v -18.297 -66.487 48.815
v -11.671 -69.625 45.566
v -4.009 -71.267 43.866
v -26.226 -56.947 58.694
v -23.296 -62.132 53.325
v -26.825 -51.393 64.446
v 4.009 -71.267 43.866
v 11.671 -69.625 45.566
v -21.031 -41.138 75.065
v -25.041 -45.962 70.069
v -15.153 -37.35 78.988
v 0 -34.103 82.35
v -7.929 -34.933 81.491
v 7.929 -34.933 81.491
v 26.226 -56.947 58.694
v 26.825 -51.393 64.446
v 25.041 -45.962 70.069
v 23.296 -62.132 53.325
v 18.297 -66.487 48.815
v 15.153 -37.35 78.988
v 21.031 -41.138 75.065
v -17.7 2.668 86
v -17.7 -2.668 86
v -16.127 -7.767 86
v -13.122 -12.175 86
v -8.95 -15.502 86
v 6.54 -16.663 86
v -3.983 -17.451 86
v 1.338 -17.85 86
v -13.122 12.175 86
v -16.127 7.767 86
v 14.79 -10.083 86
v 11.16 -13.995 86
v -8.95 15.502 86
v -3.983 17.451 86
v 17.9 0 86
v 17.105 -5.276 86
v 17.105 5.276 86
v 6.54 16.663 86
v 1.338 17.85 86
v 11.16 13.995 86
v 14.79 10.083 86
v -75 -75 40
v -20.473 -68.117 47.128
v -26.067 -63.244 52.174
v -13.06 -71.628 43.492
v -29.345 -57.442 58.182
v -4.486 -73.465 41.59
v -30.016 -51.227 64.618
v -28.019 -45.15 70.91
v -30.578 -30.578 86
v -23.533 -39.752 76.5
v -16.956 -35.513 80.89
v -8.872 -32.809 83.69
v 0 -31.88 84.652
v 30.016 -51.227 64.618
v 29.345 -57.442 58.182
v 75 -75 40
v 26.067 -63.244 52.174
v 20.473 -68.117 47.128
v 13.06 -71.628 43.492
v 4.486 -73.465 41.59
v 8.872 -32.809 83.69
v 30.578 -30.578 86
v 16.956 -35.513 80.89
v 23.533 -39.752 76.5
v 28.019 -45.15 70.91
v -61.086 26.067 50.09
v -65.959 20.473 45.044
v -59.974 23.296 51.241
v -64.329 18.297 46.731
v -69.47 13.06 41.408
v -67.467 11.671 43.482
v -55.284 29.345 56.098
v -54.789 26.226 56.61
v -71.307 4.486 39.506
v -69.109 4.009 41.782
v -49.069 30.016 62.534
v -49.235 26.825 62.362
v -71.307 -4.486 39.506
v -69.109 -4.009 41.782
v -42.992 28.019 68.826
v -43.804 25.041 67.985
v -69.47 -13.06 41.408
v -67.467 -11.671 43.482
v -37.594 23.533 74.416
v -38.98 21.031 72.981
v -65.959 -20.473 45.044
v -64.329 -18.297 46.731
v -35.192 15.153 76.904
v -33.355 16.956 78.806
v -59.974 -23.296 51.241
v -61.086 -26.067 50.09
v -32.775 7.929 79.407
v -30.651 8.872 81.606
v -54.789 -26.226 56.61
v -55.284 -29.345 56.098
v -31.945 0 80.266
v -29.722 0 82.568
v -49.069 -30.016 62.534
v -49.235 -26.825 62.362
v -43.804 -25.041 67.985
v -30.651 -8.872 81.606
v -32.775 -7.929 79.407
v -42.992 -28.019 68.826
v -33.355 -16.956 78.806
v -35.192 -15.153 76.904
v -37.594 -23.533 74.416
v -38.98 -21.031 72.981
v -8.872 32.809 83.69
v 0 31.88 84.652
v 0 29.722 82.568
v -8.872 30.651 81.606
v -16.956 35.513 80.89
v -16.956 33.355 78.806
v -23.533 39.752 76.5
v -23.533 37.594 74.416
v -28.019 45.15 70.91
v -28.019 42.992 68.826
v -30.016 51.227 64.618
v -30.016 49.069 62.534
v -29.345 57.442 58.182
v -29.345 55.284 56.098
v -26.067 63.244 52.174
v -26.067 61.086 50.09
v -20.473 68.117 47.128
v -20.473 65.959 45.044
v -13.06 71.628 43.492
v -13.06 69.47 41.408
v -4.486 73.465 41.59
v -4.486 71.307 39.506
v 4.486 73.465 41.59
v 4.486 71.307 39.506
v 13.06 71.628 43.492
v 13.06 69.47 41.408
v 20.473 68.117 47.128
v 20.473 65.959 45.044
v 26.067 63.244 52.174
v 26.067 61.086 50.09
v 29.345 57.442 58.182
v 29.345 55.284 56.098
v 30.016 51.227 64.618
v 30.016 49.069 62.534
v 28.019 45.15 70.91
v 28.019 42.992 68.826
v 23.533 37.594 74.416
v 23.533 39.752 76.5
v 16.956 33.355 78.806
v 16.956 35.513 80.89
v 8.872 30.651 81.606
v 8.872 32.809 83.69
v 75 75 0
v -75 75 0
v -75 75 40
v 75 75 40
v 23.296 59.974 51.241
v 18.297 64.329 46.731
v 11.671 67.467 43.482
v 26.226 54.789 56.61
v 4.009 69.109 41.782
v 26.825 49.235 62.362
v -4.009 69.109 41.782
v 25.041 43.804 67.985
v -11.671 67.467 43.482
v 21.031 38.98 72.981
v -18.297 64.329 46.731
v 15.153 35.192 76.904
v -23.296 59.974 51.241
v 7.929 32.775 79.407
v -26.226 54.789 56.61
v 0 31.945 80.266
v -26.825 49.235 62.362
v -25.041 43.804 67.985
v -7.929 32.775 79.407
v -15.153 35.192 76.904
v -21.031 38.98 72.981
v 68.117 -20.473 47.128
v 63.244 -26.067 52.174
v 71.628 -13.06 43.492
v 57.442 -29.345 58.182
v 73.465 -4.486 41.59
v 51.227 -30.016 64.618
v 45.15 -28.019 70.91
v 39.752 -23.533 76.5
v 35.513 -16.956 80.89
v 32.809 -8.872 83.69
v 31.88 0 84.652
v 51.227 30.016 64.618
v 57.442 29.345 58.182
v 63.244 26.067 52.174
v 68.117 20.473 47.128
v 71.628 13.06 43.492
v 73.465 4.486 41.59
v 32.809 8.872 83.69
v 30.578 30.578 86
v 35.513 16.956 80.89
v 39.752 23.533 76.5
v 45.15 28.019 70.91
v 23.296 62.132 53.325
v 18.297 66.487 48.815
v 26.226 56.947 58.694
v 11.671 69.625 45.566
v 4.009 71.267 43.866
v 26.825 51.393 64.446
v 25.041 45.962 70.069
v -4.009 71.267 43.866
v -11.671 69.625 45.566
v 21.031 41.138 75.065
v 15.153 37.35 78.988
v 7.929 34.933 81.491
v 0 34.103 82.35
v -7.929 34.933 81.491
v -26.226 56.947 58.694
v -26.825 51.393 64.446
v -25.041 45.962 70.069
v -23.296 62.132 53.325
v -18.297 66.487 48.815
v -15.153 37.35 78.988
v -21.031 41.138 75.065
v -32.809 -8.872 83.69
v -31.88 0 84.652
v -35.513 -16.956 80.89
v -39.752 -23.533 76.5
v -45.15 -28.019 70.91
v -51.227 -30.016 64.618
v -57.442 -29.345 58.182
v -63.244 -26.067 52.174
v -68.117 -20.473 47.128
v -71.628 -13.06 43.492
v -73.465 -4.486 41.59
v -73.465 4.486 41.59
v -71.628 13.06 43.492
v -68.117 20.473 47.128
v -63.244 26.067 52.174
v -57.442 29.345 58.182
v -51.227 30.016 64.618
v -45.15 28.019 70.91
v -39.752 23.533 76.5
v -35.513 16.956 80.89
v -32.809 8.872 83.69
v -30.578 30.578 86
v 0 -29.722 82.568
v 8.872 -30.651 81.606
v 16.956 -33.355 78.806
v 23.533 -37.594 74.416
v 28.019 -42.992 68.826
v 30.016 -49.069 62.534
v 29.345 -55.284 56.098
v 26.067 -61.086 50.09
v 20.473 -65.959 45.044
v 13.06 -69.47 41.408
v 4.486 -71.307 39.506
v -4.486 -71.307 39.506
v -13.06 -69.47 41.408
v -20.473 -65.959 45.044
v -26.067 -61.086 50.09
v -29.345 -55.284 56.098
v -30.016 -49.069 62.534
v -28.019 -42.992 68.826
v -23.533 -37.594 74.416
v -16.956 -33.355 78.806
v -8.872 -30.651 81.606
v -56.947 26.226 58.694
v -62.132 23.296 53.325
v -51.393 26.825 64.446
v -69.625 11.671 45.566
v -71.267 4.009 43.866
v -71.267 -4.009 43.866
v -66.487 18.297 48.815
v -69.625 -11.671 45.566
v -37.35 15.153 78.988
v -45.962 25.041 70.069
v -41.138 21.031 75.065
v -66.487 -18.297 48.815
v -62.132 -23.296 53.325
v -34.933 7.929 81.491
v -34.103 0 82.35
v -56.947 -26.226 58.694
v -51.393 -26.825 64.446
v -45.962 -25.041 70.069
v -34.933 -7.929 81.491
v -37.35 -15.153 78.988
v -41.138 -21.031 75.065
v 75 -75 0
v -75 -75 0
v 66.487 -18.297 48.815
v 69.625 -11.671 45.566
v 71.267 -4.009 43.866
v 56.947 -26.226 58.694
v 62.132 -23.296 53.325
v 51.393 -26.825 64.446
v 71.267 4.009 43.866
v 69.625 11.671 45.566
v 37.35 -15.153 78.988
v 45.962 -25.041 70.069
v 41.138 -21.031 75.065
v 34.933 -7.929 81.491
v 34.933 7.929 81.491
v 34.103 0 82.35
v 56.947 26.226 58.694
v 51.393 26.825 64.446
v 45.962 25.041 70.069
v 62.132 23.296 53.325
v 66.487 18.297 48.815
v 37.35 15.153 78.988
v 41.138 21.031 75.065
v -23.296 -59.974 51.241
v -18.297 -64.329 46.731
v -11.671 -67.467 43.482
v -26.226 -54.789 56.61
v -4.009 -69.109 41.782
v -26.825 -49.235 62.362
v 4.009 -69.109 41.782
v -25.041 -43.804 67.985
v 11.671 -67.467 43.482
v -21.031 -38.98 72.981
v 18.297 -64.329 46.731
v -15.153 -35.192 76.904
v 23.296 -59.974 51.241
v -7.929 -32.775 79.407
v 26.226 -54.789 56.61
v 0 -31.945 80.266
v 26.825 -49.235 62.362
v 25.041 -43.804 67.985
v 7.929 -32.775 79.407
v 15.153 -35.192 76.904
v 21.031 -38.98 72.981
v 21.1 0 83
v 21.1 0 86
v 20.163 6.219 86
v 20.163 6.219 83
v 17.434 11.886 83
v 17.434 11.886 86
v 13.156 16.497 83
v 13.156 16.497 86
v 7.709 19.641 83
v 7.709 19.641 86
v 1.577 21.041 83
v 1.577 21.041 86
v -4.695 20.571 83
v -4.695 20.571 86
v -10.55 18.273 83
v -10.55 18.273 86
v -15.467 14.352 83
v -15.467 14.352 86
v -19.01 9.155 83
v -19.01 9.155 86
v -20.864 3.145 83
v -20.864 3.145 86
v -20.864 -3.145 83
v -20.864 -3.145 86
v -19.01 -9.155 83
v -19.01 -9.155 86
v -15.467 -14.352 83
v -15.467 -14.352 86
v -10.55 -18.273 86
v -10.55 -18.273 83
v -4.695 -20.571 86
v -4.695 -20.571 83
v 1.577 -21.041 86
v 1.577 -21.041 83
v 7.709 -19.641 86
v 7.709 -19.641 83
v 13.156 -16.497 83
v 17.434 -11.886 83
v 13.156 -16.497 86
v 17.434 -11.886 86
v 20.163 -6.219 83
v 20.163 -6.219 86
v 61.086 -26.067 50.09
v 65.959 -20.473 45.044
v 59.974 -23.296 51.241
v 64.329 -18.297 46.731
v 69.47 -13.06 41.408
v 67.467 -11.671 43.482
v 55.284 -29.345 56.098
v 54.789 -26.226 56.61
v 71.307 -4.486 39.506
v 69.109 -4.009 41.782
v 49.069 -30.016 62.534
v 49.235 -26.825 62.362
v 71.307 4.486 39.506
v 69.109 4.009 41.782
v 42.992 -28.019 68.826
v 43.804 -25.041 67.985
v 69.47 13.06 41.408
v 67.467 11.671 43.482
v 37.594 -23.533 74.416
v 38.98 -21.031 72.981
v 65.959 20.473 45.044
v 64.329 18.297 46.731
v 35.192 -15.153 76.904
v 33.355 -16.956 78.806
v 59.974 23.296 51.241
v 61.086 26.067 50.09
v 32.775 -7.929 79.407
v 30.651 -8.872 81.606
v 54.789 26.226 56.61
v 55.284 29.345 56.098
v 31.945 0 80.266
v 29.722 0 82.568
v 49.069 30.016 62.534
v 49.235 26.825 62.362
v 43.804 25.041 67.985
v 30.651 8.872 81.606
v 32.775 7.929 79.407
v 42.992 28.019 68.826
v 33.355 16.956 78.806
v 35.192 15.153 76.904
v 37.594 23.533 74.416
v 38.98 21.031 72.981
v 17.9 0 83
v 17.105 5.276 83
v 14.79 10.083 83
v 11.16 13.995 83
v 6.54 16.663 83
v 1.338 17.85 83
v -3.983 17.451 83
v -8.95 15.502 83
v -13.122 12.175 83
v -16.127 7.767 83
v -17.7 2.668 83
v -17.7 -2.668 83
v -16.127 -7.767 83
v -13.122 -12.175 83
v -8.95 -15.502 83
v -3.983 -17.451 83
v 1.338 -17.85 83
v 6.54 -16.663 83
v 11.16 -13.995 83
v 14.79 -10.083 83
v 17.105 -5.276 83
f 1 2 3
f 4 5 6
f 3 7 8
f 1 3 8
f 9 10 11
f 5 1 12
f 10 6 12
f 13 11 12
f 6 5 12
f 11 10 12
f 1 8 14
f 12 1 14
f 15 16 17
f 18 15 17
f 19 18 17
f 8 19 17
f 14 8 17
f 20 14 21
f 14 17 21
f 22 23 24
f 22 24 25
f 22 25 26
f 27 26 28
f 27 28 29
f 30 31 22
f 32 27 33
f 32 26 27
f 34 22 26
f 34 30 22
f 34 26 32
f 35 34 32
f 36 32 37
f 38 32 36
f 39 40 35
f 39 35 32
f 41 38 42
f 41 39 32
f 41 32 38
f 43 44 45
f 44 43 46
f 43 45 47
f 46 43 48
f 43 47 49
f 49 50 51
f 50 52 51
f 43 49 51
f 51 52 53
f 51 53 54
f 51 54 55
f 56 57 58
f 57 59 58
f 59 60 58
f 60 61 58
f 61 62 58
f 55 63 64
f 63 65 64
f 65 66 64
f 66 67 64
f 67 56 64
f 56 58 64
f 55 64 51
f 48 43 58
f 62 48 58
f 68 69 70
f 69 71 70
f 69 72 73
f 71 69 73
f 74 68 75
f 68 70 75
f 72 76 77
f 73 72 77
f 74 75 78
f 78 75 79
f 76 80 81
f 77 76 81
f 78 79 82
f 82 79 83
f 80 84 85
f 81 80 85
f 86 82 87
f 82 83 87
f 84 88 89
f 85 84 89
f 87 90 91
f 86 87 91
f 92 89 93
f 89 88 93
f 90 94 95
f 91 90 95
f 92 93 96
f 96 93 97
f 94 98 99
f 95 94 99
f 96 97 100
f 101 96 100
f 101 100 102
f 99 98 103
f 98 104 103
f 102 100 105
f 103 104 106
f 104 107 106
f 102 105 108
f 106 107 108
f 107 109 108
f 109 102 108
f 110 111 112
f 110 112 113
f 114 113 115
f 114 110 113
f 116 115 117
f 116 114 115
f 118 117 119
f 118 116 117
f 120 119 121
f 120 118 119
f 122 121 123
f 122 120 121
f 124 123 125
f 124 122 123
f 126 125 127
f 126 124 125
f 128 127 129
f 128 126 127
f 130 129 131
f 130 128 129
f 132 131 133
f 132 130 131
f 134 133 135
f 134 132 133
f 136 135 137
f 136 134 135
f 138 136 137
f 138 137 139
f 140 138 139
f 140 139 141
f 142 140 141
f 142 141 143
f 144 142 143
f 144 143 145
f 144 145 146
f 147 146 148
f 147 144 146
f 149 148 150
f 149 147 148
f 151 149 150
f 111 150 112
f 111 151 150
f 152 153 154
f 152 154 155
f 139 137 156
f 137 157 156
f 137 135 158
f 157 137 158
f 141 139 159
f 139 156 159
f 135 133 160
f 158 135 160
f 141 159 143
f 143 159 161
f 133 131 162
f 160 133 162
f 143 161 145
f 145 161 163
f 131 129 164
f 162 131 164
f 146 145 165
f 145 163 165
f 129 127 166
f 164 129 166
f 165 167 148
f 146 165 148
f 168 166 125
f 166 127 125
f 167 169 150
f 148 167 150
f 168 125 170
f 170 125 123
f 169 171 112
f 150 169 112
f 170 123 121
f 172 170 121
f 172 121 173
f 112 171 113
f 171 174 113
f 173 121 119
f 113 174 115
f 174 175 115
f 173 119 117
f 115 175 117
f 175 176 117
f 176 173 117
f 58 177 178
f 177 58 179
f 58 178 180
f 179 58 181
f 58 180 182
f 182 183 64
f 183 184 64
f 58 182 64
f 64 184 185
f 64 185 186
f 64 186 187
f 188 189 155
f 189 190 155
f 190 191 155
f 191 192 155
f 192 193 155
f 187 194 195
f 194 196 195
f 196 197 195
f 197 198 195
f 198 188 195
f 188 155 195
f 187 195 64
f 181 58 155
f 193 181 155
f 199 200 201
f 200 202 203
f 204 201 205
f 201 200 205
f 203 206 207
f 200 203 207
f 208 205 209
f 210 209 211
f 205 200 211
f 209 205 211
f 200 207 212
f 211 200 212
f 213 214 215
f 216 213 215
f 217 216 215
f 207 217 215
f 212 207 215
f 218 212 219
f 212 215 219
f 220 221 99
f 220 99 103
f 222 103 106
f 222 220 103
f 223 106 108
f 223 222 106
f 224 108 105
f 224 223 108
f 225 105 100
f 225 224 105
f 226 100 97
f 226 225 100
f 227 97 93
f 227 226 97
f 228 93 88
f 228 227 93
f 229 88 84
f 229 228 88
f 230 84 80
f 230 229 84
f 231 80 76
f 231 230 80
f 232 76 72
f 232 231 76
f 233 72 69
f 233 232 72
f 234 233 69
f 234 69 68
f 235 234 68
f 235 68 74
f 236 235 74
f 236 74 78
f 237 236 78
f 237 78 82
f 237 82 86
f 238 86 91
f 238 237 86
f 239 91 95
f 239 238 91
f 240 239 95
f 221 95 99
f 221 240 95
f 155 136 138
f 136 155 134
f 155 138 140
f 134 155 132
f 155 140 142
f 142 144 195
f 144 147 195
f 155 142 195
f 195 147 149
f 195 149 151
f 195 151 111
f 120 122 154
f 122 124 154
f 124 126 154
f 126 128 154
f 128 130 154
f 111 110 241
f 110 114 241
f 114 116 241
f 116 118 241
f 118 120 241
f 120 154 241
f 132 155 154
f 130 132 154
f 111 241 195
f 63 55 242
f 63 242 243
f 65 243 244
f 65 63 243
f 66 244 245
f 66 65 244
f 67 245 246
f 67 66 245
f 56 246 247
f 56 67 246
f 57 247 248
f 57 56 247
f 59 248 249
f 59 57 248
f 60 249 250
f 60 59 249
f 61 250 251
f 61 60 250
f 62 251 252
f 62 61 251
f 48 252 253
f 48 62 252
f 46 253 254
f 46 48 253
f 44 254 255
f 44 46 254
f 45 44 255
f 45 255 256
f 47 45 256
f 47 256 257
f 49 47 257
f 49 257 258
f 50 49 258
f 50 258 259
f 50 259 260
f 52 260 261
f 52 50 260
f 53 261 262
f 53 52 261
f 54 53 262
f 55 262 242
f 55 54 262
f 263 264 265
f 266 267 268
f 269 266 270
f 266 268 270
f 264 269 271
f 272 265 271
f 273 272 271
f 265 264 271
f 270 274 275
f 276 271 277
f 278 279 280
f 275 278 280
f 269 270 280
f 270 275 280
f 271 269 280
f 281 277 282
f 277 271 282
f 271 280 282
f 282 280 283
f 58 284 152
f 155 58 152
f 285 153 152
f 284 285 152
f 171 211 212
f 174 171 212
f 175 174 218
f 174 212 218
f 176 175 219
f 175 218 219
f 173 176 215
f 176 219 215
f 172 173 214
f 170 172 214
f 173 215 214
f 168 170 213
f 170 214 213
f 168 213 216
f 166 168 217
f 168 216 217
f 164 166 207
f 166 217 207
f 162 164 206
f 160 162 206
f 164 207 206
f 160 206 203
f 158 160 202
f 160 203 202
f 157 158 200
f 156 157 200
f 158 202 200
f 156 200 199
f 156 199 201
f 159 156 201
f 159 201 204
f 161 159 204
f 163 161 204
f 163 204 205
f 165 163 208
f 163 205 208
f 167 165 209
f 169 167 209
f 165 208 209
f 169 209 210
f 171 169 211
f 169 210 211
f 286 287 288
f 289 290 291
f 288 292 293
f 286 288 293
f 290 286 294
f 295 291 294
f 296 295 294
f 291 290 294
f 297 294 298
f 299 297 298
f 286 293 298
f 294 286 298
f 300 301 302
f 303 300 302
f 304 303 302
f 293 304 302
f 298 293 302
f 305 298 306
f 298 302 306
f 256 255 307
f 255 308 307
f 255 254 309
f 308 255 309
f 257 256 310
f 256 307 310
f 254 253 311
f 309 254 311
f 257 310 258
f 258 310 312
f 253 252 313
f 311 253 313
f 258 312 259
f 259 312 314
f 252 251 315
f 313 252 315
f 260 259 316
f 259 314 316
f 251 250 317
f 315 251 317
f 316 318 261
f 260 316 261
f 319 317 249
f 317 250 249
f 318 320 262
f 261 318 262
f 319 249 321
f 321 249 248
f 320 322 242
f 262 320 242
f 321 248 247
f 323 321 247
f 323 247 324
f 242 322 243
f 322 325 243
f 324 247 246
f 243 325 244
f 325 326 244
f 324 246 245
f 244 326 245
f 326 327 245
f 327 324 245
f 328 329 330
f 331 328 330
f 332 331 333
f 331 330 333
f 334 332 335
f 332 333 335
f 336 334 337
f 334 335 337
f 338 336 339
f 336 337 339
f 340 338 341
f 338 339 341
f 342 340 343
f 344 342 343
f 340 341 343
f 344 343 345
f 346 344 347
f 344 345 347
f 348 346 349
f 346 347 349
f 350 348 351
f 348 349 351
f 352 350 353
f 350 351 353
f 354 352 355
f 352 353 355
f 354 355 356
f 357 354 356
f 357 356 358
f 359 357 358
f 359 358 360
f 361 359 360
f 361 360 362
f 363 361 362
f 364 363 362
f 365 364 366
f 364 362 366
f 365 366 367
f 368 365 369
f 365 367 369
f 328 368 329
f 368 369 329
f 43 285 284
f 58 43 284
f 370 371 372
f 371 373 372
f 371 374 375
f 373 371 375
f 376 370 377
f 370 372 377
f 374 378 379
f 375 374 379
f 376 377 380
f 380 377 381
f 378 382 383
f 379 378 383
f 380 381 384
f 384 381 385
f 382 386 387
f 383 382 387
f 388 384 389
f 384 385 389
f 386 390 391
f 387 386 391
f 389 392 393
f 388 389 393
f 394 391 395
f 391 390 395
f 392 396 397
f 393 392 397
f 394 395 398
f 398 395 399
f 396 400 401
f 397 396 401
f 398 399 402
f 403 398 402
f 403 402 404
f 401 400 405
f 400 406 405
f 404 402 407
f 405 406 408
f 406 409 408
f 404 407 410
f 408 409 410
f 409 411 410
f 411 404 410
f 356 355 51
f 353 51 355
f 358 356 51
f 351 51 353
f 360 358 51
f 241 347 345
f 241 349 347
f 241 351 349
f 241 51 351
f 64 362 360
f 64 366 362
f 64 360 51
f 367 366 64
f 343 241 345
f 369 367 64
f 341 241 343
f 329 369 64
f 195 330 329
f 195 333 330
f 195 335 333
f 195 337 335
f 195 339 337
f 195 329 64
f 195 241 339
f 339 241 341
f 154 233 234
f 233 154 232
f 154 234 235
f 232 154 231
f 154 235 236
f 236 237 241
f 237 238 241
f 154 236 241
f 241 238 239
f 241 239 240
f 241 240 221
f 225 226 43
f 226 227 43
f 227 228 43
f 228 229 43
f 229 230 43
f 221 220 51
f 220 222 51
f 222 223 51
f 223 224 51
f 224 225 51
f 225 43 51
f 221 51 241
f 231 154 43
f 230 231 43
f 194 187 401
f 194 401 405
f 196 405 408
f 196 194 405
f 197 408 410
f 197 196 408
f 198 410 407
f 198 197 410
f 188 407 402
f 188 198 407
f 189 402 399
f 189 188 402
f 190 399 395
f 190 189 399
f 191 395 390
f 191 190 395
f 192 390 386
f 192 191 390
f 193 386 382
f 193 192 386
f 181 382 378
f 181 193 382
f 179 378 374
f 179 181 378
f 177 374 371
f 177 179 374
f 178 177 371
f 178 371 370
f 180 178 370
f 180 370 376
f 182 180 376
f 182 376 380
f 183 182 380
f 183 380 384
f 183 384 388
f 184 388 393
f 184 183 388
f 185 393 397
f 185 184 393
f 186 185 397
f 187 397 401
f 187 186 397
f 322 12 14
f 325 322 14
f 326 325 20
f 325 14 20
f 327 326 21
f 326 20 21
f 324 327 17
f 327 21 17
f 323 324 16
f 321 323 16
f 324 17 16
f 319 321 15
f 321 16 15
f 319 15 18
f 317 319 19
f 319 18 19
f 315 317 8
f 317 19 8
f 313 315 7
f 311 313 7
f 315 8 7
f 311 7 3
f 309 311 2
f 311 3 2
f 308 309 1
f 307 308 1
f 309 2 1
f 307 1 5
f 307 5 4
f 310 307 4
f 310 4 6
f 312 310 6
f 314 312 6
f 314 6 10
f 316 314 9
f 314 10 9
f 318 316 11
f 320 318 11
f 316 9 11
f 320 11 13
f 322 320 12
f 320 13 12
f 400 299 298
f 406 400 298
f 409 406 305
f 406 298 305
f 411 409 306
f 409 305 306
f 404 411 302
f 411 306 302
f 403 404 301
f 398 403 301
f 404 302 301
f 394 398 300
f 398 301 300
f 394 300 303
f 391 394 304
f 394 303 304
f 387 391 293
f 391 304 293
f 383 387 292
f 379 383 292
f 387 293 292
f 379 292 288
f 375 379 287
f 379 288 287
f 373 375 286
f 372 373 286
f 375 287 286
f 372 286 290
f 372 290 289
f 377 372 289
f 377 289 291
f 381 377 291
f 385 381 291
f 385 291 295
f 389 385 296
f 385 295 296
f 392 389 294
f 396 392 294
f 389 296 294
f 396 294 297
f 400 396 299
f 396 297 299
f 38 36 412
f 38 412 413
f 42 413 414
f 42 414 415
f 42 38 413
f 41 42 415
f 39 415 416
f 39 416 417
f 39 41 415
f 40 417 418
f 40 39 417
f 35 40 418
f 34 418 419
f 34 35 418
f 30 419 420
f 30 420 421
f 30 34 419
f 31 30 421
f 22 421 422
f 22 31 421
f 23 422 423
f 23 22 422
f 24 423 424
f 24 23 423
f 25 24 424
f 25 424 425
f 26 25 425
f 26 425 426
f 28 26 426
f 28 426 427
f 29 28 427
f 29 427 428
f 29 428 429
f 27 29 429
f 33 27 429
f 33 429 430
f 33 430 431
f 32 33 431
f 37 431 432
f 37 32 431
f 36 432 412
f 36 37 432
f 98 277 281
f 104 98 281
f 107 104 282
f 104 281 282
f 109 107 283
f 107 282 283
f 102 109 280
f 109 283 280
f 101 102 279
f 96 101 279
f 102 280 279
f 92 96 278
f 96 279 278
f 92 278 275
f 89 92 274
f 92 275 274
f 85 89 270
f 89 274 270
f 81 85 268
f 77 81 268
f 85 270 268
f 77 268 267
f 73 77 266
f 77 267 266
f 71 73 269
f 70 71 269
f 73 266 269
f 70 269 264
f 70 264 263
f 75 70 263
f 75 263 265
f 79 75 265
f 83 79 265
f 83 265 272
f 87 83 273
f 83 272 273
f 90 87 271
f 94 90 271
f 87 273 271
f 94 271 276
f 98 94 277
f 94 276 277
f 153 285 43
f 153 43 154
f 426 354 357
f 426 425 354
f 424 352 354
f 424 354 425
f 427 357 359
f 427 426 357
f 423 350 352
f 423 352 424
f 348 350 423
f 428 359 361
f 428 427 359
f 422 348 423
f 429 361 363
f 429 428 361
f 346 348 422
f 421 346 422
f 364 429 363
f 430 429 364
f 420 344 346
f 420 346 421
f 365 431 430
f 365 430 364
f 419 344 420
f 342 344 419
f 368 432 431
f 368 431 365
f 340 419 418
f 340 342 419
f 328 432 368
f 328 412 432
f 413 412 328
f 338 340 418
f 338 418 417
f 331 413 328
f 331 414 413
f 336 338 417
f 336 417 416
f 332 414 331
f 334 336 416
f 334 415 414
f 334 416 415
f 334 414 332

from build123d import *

# Parameters (mm, degrees)
SKETCH_W           = 150
SKETCH_H           = 150
PAD_DEPTH          = 40
SKETCH001_W        = 150
SKETCH001_H        = 150
PAD001_DEPTH       = 46
PAD001_TAPER       = 44
SKETCH002_R        = 30.1
SKETCH002_R_2      = 26.9
POCKET_DEPTH       = 3
POLARPATTERN_COUNT = 4
SKETCH003_R        = 21.1
SKETCH003_R_2      = 17.9
POCKET001_DEPTH    = 3


with BuildPart() as part:
    # Sketch → Pad (new body)
    with BuildSketch(Plane.XY):
        Rectangle(SKETCH_W, SKETCH_H)
    extrude(amount=PAD_DEPTH)

    # Sketch001 (on Face6 of Pad) → Pad001 (join)
    with BuildSketch(Plane.XY.offset(40)):
        Rectangle(SKETCH001_W, SKETCH001_H)
    extrude(amount=PAD001_DEPTH, taper=PAD001_TAPER)

    # Sketch002 (on Face10 of Pad001) → Pocket (cut)
    with BuildSketch(Plane(origin=(0, -55.9042011882, 59.7742785357), x_dir=(0, 0.6946583705, 0.7193398003), z_dir=(0, 0.7193398003, -0.6946583705))):
        with Locations((4.4842805345, 0)):
            Circle(SKETCH002_R)
        with Locations((4.4842805345, 0)):
            Circle(SKETCH002_R_2, mode=Mode.SUBTRACT)
    pocket = extrude(amount=POCKET_DEPTH, mode=Mode.SUBTRACT)

    # PolarPattern: Pocket ×4 about axis
    polarpattern_axis = Axis((0, 0, 0), (0, 0, 1))
    for i in range(1, POLARPATTERN_COUNT):
        add(pocket.rotate(polarpattern_axis, i * 360 / POLARPATTERN_COUNT), mode=Mode.SUBTRACT)

    # Sketch003 → Pocket001 (cut)
    with BuildSketch(Plane.XY.offset(86)):
        Circle(SKETCH003_R)
        Circle(SKETCH003_R_2, mode=Mode.SUBTRACT)
    extrude(amount=-POCKET001_DEPTH, mode=Mode.SUBTRACT)


solid = part.part
